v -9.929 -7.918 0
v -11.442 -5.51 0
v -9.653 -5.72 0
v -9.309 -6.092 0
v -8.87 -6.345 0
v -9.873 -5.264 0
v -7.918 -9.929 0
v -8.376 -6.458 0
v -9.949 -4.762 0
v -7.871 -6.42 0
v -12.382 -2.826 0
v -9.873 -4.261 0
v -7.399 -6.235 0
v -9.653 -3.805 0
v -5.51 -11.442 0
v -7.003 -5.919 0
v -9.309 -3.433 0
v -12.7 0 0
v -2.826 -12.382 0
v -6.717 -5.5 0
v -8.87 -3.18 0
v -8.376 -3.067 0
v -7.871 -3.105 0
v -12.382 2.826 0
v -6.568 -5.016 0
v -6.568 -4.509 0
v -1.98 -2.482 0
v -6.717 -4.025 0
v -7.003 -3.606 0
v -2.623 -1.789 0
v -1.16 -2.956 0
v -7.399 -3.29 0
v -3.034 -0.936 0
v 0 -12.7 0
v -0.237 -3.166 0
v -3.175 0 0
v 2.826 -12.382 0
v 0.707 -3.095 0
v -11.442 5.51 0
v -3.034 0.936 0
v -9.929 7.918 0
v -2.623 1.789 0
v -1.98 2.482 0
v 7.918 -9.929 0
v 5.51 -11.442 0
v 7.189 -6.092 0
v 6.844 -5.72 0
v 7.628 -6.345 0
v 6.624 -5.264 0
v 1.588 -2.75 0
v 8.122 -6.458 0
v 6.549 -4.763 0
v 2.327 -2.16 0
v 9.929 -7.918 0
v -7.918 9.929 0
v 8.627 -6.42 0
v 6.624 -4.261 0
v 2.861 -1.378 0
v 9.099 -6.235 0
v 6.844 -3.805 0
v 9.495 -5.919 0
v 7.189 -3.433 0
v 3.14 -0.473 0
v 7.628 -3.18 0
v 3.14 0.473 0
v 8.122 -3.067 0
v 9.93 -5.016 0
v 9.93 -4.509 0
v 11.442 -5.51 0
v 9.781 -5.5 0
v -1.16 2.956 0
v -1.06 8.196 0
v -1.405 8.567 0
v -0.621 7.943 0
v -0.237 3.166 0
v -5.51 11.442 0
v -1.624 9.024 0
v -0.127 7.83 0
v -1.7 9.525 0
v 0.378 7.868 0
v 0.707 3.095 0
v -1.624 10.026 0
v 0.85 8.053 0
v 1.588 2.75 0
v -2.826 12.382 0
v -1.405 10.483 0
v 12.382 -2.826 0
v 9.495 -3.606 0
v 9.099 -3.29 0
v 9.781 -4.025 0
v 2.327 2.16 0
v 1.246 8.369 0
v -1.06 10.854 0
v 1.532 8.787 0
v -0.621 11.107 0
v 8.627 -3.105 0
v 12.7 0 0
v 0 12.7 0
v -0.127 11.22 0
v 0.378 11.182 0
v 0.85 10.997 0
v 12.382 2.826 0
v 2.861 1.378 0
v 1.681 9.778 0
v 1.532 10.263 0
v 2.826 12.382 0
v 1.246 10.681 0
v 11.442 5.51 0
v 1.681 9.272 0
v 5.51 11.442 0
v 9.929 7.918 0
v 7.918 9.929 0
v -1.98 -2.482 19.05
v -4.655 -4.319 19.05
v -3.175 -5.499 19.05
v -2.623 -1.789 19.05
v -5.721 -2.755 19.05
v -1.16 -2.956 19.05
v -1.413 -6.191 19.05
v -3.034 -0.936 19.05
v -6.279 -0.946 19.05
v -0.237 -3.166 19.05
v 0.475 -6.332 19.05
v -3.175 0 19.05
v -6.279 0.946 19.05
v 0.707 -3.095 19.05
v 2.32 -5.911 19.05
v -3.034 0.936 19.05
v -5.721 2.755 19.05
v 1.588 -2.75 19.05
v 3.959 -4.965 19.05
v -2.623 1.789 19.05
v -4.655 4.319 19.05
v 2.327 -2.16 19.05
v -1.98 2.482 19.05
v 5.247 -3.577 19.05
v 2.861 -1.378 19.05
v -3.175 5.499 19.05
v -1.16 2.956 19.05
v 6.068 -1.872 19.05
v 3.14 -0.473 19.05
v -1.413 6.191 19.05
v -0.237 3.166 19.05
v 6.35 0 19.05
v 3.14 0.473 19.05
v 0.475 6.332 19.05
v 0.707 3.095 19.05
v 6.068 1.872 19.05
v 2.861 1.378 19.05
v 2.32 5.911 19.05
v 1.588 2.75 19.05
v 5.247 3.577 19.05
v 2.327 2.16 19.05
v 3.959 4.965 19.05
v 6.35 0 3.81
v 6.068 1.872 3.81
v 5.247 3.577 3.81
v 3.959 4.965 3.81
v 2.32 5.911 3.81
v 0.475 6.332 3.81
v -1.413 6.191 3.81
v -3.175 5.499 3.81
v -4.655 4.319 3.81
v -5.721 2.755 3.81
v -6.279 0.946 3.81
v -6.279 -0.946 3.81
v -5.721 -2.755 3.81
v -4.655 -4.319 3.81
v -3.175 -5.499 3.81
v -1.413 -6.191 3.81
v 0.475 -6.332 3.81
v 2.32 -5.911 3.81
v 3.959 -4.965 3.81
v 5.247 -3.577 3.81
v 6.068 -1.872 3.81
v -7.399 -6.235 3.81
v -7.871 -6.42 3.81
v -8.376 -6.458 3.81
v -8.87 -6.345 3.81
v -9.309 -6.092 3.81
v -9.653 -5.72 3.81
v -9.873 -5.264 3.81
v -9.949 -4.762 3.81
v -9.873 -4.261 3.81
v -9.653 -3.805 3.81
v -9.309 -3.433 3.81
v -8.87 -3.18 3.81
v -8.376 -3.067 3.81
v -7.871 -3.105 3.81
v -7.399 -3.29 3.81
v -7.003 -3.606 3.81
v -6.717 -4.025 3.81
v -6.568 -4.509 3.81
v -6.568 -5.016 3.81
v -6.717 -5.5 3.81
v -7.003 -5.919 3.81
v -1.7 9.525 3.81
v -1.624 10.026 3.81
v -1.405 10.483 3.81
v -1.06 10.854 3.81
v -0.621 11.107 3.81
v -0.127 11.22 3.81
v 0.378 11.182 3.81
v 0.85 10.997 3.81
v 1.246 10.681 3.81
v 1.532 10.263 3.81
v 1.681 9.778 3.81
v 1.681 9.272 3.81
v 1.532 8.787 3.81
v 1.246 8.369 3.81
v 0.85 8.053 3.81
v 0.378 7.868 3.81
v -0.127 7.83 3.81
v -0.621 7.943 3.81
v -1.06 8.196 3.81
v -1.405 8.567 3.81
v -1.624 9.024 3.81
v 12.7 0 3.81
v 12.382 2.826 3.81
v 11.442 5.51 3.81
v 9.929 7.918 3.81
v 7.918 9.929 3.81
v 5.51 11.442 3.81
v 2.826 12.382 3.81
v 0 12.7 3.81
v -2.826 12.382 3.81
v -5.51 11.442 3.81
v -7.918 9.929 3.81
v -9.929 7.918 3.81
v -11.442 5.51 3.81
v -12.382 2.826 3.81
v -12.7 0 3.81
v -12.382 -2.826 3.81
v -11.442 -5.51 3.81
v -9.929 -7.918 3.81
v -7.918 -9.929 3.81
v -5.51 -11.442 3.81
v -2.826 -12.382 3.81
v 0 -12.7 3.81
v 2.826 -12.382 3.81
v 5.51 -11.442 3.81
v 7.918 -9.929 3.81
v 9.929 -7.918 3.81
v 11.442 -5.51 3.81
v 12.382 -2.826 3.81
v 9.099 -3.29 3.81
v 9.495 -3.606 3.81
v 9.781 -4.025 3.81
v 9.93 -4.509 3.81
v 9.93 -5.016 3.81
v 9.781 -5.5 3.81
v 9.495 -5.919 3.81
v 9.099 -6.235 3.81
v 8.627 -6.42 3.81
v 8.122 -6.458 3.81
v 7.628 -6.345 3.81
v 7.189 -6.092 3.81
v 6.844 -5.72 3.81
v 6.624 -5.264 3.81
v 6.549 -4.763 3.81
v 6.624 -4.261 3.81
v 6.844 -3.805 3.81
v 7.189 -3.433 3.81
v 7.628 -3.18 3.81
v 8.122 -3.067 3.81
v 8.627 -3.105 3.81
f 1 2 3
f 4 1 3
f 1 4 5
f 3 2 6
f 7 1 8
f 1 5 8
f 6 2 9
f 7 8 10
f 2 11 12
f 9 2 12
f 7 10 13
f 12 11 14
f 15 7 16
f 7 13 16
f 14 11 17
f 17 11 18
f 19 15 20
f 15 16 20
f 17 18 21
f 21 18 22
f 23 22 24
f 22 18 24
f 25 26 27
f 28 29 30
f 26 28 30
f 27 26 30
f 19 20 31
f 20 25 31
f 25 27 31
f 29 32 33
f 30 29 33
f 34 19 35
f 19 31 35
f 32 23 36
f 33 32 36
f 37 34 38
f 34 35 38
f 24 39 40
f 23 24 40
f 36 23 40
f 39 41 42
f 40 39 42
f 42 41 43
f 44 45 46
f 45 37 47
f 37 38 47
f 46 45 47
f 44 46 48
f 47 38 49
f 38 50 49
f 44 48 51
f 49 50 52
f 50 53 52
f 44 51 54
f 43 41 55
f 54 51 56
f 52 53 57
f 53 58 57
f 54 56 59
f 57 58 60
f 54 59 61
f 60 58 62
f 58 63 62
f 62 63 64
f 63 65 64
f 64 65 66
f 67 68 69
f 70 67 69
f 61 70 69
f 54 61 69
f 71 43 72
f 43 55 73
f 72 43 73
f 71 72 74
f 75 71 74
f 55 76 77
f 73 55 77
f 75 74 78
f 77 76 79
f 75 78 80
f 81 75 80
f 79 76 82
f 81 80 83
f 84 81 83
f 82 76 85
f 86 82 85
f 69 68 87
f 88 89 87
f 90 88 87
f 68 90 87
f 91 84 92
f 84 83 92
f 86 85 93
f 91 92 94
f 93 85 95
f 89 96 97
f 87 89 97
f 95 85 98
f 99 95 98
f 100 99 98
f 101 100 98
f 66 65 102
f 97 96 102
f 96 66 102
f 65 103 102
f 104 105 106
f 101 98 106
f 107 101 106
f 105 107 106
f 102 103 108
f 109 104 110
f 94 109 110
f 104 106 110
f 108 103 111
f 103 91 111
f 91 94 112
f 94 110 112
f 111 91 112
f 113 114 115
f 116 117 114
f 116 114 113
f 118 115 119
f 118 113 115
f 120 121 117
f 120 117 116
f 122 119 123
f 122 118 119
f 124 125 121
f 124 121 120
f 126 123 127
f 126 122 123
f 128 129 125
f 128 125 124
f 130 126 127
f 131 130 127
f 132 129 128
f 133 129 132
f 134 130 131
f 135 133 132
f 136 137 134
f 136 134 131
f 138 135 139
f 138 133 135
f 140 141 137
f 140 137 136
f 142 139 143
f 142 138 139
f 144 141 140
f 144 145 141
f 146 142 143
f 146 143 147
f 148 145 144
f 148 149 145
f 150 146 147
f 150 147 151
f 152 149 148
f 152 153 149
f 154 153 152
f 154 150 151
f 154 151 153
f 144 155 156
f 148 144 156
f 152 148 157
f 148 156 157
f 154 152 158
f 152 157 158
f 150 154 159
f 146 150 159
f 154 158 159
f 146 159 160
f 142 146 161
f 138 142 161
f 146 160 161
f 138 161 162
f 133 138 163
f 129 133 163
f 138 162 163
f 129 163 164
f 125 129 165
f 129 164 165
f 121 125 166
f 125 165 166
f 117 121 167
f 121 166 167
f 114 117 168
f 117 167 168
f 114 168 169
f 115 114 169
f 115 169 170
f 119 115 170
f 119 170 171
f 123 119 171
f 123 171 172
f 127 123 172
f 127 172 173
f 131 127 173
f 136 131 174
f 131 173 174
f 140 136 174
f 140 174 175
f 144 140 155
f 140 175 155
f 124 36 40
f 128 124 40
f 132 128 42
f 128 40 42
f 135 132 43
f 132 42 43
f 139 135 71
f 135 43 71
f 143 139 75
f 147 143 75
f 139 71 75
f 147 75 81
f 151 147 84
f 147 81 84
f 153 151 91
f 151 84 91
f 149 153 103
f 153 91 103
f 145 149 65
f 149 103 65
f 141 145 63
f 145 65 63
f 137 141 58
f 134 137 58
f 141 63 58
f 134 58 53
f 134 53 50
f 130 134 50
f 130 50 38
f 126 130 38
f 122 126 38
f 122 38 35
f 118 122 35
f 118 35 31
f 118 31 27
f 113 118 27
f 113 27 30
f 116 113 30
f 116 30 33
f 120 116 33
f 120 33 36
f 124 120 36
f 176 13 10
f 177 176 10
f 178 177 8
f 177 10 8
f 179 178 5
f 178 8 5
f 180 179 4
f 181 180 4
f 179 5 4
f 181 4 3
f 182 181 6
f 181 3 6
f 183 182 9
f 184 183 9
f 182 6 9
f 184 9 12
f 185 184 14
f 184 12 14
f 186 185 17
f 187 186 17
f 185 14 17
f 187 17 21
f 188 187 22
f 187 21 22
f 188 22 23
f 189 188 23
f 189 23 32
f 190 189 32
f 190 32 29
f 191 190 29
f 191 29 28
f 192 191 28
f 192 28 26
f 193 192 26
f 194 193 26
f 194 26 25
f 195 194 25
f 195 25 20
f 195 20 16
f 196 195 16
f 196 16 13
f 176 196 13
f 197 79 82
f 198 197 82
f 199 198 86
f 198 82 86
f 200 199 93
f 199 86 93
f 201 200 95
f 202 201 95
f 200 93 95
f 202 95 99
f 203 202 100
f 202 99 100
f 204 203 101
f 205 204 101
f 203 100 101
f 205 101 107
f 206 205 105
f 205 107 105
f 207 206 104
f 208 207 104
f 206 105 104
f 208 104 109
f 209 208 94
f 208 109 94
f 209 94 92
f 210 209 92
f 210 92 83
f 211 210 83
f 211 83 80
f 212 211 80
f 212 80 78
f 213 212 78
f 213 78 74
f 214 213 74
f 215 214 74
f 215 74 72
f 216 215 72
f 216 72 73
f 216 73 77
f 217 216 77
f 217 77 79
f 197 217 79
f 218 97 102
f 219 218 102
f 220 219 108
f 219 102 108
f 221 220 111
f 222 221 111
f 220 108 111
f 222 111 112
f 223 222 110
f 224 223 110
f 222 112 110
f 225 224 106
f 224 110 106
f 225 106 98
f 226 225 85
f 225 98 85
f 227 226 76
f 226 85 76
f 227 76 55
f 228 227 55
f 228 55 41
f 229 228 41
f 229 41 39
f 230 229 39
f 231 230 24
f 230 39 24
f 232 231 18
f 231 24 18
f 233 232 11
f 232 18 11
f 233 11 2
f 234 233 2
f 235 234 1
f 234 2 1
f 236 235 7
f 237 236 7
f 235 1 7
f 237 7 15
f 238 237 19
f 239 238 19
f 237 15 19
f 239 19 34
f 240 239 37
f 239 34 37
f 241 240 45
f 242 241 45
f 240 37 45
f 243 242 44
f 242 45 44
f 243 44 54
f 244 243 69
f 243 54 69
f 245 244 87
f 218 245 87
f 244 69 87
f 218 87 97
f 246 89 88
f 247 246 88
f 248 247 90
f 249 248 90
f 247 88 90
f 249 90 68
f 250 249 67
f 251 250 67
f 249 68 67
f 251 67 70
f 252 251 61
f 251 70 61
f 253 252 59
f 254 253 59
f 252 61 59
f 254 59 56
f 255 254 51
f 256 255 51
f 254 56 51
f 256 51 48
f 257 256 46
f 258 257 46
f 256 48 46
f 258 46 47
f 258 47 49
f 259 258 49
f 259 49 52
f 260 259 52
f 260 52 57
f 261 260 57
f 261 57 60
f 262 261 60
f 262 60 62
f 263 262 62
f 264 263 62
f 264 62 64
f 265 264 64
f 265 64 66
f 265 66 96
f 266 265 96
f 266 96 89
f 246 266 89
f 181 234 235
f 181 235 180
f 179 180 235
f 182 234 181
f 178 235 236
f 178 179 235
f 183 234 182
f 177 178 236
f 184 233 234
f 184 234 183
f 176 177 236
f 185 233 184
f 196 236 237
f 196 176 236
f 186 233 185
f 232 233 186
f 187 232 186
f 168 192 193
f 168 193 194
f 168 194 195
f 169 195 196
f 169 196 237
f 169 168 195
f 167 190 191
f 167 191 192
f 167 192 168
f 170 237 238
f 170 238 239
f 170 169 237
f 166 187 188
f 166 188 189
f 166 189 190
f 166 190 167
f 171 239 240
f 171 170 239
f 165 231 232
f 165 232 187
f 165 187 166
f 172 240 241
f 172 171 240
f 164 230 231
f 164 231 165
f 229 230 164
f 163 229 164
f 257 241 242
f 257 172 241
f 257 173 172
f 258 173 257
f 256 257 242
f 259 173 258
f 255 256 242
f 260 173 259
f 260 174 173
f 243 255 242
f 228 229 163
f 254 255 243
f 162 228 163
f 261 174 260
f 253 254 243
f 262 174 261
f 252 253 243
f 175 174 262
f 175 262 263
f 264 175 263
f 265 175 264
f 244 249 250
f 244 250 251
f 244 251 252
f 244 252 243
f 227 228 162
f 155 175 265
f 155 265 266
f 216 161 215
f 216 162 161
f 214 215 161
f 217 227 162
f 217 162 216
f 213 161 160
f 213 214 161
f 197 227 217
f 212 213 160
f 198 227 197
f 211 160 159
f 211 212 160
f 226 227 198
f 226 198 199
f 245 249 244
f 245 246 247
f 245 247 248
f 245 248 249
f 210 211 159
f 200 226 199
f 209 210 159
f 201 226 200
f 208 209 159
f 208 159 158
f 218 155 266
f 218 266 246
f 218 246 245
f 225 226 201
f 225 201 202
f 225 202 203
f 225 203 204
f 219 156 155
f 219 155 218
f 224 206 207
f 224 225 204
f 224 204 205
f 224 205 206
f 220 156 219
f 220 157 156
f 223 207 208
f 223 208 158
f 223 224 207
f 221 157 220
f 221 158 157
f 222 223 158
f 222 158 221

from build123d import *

# Parameters (mm, degrees)
SCHIZZO1_R                   = 12.7
ESTRUSIONE_ESTRUSIONE1_DEPTH = 3.81
SCHIZZO2_R                   = 6.35
ESTRUSIONE_ESTRUSIONE2_DEPTH = 15.24
FORI_ALESATO_4_0MM1_D        = 6.35
FORO_PER_VITE_M3_1_D         = 3.4
RIPETIZIONECIRCOLARE2_COUNT  = 3


with BuildPart() as part:
    # Schizzo1 → Estrusione-Estrusione1 (new body)
    with BuildSketch(Plane(origin=(0, 0, 0), x_dir=(0, 1, 0), z_dir=(0, 0, 1))):
        with Locations(Location((0, 0, 0), (0, 0, 270))):
            Circle(SCHIZZO1_R)
    extrude(amount=ESTRUSIONE_ESTRUSIONE1_DEPTH)

    # Schizzo2 → Estrusione-Estrusione2 (add)
    with BuildSketch(Plane.XY.offset(3.81)):
        Circle(SCHIZZO2_R)
    extrude(amount=ESTRUSIONE_ESTRUSIONE2_DEPTH)

    # Fori Alesato Ø4.0mm1 (through all)
    with Locations(Plane.XY.offset(19.05)):
        with Locations((0, 0)):
            Hole(FORI_ALESATO_4_0MM1_D / 2)

    # Foro per Vite M3-1 (through all)
    with Locations(Plane.XY.offset(3.81)):
        with Locations((0, 9.525)):
            foro_per_vite_m3_1 = Hole(FORO_PER_VITE_M3_1_D / 2)

    # RipetizioneCircolare2: Foro per Vite M3-1 ×3 about axis
    ripetizionecircolare2_axis = Axis((0, 0, 0), (0, 0, 1))
    for i in range(1, RIPETIZIONECIRCOLARE2_COUNT):
        add(foro_per_vite_m3_1.rotate(ripetizionecircolare2_axis, i * 360 / RIPETIZIONECIRCOLARE2_COUNT), mode=Mode.SUBTRACT)


solid = part.part
